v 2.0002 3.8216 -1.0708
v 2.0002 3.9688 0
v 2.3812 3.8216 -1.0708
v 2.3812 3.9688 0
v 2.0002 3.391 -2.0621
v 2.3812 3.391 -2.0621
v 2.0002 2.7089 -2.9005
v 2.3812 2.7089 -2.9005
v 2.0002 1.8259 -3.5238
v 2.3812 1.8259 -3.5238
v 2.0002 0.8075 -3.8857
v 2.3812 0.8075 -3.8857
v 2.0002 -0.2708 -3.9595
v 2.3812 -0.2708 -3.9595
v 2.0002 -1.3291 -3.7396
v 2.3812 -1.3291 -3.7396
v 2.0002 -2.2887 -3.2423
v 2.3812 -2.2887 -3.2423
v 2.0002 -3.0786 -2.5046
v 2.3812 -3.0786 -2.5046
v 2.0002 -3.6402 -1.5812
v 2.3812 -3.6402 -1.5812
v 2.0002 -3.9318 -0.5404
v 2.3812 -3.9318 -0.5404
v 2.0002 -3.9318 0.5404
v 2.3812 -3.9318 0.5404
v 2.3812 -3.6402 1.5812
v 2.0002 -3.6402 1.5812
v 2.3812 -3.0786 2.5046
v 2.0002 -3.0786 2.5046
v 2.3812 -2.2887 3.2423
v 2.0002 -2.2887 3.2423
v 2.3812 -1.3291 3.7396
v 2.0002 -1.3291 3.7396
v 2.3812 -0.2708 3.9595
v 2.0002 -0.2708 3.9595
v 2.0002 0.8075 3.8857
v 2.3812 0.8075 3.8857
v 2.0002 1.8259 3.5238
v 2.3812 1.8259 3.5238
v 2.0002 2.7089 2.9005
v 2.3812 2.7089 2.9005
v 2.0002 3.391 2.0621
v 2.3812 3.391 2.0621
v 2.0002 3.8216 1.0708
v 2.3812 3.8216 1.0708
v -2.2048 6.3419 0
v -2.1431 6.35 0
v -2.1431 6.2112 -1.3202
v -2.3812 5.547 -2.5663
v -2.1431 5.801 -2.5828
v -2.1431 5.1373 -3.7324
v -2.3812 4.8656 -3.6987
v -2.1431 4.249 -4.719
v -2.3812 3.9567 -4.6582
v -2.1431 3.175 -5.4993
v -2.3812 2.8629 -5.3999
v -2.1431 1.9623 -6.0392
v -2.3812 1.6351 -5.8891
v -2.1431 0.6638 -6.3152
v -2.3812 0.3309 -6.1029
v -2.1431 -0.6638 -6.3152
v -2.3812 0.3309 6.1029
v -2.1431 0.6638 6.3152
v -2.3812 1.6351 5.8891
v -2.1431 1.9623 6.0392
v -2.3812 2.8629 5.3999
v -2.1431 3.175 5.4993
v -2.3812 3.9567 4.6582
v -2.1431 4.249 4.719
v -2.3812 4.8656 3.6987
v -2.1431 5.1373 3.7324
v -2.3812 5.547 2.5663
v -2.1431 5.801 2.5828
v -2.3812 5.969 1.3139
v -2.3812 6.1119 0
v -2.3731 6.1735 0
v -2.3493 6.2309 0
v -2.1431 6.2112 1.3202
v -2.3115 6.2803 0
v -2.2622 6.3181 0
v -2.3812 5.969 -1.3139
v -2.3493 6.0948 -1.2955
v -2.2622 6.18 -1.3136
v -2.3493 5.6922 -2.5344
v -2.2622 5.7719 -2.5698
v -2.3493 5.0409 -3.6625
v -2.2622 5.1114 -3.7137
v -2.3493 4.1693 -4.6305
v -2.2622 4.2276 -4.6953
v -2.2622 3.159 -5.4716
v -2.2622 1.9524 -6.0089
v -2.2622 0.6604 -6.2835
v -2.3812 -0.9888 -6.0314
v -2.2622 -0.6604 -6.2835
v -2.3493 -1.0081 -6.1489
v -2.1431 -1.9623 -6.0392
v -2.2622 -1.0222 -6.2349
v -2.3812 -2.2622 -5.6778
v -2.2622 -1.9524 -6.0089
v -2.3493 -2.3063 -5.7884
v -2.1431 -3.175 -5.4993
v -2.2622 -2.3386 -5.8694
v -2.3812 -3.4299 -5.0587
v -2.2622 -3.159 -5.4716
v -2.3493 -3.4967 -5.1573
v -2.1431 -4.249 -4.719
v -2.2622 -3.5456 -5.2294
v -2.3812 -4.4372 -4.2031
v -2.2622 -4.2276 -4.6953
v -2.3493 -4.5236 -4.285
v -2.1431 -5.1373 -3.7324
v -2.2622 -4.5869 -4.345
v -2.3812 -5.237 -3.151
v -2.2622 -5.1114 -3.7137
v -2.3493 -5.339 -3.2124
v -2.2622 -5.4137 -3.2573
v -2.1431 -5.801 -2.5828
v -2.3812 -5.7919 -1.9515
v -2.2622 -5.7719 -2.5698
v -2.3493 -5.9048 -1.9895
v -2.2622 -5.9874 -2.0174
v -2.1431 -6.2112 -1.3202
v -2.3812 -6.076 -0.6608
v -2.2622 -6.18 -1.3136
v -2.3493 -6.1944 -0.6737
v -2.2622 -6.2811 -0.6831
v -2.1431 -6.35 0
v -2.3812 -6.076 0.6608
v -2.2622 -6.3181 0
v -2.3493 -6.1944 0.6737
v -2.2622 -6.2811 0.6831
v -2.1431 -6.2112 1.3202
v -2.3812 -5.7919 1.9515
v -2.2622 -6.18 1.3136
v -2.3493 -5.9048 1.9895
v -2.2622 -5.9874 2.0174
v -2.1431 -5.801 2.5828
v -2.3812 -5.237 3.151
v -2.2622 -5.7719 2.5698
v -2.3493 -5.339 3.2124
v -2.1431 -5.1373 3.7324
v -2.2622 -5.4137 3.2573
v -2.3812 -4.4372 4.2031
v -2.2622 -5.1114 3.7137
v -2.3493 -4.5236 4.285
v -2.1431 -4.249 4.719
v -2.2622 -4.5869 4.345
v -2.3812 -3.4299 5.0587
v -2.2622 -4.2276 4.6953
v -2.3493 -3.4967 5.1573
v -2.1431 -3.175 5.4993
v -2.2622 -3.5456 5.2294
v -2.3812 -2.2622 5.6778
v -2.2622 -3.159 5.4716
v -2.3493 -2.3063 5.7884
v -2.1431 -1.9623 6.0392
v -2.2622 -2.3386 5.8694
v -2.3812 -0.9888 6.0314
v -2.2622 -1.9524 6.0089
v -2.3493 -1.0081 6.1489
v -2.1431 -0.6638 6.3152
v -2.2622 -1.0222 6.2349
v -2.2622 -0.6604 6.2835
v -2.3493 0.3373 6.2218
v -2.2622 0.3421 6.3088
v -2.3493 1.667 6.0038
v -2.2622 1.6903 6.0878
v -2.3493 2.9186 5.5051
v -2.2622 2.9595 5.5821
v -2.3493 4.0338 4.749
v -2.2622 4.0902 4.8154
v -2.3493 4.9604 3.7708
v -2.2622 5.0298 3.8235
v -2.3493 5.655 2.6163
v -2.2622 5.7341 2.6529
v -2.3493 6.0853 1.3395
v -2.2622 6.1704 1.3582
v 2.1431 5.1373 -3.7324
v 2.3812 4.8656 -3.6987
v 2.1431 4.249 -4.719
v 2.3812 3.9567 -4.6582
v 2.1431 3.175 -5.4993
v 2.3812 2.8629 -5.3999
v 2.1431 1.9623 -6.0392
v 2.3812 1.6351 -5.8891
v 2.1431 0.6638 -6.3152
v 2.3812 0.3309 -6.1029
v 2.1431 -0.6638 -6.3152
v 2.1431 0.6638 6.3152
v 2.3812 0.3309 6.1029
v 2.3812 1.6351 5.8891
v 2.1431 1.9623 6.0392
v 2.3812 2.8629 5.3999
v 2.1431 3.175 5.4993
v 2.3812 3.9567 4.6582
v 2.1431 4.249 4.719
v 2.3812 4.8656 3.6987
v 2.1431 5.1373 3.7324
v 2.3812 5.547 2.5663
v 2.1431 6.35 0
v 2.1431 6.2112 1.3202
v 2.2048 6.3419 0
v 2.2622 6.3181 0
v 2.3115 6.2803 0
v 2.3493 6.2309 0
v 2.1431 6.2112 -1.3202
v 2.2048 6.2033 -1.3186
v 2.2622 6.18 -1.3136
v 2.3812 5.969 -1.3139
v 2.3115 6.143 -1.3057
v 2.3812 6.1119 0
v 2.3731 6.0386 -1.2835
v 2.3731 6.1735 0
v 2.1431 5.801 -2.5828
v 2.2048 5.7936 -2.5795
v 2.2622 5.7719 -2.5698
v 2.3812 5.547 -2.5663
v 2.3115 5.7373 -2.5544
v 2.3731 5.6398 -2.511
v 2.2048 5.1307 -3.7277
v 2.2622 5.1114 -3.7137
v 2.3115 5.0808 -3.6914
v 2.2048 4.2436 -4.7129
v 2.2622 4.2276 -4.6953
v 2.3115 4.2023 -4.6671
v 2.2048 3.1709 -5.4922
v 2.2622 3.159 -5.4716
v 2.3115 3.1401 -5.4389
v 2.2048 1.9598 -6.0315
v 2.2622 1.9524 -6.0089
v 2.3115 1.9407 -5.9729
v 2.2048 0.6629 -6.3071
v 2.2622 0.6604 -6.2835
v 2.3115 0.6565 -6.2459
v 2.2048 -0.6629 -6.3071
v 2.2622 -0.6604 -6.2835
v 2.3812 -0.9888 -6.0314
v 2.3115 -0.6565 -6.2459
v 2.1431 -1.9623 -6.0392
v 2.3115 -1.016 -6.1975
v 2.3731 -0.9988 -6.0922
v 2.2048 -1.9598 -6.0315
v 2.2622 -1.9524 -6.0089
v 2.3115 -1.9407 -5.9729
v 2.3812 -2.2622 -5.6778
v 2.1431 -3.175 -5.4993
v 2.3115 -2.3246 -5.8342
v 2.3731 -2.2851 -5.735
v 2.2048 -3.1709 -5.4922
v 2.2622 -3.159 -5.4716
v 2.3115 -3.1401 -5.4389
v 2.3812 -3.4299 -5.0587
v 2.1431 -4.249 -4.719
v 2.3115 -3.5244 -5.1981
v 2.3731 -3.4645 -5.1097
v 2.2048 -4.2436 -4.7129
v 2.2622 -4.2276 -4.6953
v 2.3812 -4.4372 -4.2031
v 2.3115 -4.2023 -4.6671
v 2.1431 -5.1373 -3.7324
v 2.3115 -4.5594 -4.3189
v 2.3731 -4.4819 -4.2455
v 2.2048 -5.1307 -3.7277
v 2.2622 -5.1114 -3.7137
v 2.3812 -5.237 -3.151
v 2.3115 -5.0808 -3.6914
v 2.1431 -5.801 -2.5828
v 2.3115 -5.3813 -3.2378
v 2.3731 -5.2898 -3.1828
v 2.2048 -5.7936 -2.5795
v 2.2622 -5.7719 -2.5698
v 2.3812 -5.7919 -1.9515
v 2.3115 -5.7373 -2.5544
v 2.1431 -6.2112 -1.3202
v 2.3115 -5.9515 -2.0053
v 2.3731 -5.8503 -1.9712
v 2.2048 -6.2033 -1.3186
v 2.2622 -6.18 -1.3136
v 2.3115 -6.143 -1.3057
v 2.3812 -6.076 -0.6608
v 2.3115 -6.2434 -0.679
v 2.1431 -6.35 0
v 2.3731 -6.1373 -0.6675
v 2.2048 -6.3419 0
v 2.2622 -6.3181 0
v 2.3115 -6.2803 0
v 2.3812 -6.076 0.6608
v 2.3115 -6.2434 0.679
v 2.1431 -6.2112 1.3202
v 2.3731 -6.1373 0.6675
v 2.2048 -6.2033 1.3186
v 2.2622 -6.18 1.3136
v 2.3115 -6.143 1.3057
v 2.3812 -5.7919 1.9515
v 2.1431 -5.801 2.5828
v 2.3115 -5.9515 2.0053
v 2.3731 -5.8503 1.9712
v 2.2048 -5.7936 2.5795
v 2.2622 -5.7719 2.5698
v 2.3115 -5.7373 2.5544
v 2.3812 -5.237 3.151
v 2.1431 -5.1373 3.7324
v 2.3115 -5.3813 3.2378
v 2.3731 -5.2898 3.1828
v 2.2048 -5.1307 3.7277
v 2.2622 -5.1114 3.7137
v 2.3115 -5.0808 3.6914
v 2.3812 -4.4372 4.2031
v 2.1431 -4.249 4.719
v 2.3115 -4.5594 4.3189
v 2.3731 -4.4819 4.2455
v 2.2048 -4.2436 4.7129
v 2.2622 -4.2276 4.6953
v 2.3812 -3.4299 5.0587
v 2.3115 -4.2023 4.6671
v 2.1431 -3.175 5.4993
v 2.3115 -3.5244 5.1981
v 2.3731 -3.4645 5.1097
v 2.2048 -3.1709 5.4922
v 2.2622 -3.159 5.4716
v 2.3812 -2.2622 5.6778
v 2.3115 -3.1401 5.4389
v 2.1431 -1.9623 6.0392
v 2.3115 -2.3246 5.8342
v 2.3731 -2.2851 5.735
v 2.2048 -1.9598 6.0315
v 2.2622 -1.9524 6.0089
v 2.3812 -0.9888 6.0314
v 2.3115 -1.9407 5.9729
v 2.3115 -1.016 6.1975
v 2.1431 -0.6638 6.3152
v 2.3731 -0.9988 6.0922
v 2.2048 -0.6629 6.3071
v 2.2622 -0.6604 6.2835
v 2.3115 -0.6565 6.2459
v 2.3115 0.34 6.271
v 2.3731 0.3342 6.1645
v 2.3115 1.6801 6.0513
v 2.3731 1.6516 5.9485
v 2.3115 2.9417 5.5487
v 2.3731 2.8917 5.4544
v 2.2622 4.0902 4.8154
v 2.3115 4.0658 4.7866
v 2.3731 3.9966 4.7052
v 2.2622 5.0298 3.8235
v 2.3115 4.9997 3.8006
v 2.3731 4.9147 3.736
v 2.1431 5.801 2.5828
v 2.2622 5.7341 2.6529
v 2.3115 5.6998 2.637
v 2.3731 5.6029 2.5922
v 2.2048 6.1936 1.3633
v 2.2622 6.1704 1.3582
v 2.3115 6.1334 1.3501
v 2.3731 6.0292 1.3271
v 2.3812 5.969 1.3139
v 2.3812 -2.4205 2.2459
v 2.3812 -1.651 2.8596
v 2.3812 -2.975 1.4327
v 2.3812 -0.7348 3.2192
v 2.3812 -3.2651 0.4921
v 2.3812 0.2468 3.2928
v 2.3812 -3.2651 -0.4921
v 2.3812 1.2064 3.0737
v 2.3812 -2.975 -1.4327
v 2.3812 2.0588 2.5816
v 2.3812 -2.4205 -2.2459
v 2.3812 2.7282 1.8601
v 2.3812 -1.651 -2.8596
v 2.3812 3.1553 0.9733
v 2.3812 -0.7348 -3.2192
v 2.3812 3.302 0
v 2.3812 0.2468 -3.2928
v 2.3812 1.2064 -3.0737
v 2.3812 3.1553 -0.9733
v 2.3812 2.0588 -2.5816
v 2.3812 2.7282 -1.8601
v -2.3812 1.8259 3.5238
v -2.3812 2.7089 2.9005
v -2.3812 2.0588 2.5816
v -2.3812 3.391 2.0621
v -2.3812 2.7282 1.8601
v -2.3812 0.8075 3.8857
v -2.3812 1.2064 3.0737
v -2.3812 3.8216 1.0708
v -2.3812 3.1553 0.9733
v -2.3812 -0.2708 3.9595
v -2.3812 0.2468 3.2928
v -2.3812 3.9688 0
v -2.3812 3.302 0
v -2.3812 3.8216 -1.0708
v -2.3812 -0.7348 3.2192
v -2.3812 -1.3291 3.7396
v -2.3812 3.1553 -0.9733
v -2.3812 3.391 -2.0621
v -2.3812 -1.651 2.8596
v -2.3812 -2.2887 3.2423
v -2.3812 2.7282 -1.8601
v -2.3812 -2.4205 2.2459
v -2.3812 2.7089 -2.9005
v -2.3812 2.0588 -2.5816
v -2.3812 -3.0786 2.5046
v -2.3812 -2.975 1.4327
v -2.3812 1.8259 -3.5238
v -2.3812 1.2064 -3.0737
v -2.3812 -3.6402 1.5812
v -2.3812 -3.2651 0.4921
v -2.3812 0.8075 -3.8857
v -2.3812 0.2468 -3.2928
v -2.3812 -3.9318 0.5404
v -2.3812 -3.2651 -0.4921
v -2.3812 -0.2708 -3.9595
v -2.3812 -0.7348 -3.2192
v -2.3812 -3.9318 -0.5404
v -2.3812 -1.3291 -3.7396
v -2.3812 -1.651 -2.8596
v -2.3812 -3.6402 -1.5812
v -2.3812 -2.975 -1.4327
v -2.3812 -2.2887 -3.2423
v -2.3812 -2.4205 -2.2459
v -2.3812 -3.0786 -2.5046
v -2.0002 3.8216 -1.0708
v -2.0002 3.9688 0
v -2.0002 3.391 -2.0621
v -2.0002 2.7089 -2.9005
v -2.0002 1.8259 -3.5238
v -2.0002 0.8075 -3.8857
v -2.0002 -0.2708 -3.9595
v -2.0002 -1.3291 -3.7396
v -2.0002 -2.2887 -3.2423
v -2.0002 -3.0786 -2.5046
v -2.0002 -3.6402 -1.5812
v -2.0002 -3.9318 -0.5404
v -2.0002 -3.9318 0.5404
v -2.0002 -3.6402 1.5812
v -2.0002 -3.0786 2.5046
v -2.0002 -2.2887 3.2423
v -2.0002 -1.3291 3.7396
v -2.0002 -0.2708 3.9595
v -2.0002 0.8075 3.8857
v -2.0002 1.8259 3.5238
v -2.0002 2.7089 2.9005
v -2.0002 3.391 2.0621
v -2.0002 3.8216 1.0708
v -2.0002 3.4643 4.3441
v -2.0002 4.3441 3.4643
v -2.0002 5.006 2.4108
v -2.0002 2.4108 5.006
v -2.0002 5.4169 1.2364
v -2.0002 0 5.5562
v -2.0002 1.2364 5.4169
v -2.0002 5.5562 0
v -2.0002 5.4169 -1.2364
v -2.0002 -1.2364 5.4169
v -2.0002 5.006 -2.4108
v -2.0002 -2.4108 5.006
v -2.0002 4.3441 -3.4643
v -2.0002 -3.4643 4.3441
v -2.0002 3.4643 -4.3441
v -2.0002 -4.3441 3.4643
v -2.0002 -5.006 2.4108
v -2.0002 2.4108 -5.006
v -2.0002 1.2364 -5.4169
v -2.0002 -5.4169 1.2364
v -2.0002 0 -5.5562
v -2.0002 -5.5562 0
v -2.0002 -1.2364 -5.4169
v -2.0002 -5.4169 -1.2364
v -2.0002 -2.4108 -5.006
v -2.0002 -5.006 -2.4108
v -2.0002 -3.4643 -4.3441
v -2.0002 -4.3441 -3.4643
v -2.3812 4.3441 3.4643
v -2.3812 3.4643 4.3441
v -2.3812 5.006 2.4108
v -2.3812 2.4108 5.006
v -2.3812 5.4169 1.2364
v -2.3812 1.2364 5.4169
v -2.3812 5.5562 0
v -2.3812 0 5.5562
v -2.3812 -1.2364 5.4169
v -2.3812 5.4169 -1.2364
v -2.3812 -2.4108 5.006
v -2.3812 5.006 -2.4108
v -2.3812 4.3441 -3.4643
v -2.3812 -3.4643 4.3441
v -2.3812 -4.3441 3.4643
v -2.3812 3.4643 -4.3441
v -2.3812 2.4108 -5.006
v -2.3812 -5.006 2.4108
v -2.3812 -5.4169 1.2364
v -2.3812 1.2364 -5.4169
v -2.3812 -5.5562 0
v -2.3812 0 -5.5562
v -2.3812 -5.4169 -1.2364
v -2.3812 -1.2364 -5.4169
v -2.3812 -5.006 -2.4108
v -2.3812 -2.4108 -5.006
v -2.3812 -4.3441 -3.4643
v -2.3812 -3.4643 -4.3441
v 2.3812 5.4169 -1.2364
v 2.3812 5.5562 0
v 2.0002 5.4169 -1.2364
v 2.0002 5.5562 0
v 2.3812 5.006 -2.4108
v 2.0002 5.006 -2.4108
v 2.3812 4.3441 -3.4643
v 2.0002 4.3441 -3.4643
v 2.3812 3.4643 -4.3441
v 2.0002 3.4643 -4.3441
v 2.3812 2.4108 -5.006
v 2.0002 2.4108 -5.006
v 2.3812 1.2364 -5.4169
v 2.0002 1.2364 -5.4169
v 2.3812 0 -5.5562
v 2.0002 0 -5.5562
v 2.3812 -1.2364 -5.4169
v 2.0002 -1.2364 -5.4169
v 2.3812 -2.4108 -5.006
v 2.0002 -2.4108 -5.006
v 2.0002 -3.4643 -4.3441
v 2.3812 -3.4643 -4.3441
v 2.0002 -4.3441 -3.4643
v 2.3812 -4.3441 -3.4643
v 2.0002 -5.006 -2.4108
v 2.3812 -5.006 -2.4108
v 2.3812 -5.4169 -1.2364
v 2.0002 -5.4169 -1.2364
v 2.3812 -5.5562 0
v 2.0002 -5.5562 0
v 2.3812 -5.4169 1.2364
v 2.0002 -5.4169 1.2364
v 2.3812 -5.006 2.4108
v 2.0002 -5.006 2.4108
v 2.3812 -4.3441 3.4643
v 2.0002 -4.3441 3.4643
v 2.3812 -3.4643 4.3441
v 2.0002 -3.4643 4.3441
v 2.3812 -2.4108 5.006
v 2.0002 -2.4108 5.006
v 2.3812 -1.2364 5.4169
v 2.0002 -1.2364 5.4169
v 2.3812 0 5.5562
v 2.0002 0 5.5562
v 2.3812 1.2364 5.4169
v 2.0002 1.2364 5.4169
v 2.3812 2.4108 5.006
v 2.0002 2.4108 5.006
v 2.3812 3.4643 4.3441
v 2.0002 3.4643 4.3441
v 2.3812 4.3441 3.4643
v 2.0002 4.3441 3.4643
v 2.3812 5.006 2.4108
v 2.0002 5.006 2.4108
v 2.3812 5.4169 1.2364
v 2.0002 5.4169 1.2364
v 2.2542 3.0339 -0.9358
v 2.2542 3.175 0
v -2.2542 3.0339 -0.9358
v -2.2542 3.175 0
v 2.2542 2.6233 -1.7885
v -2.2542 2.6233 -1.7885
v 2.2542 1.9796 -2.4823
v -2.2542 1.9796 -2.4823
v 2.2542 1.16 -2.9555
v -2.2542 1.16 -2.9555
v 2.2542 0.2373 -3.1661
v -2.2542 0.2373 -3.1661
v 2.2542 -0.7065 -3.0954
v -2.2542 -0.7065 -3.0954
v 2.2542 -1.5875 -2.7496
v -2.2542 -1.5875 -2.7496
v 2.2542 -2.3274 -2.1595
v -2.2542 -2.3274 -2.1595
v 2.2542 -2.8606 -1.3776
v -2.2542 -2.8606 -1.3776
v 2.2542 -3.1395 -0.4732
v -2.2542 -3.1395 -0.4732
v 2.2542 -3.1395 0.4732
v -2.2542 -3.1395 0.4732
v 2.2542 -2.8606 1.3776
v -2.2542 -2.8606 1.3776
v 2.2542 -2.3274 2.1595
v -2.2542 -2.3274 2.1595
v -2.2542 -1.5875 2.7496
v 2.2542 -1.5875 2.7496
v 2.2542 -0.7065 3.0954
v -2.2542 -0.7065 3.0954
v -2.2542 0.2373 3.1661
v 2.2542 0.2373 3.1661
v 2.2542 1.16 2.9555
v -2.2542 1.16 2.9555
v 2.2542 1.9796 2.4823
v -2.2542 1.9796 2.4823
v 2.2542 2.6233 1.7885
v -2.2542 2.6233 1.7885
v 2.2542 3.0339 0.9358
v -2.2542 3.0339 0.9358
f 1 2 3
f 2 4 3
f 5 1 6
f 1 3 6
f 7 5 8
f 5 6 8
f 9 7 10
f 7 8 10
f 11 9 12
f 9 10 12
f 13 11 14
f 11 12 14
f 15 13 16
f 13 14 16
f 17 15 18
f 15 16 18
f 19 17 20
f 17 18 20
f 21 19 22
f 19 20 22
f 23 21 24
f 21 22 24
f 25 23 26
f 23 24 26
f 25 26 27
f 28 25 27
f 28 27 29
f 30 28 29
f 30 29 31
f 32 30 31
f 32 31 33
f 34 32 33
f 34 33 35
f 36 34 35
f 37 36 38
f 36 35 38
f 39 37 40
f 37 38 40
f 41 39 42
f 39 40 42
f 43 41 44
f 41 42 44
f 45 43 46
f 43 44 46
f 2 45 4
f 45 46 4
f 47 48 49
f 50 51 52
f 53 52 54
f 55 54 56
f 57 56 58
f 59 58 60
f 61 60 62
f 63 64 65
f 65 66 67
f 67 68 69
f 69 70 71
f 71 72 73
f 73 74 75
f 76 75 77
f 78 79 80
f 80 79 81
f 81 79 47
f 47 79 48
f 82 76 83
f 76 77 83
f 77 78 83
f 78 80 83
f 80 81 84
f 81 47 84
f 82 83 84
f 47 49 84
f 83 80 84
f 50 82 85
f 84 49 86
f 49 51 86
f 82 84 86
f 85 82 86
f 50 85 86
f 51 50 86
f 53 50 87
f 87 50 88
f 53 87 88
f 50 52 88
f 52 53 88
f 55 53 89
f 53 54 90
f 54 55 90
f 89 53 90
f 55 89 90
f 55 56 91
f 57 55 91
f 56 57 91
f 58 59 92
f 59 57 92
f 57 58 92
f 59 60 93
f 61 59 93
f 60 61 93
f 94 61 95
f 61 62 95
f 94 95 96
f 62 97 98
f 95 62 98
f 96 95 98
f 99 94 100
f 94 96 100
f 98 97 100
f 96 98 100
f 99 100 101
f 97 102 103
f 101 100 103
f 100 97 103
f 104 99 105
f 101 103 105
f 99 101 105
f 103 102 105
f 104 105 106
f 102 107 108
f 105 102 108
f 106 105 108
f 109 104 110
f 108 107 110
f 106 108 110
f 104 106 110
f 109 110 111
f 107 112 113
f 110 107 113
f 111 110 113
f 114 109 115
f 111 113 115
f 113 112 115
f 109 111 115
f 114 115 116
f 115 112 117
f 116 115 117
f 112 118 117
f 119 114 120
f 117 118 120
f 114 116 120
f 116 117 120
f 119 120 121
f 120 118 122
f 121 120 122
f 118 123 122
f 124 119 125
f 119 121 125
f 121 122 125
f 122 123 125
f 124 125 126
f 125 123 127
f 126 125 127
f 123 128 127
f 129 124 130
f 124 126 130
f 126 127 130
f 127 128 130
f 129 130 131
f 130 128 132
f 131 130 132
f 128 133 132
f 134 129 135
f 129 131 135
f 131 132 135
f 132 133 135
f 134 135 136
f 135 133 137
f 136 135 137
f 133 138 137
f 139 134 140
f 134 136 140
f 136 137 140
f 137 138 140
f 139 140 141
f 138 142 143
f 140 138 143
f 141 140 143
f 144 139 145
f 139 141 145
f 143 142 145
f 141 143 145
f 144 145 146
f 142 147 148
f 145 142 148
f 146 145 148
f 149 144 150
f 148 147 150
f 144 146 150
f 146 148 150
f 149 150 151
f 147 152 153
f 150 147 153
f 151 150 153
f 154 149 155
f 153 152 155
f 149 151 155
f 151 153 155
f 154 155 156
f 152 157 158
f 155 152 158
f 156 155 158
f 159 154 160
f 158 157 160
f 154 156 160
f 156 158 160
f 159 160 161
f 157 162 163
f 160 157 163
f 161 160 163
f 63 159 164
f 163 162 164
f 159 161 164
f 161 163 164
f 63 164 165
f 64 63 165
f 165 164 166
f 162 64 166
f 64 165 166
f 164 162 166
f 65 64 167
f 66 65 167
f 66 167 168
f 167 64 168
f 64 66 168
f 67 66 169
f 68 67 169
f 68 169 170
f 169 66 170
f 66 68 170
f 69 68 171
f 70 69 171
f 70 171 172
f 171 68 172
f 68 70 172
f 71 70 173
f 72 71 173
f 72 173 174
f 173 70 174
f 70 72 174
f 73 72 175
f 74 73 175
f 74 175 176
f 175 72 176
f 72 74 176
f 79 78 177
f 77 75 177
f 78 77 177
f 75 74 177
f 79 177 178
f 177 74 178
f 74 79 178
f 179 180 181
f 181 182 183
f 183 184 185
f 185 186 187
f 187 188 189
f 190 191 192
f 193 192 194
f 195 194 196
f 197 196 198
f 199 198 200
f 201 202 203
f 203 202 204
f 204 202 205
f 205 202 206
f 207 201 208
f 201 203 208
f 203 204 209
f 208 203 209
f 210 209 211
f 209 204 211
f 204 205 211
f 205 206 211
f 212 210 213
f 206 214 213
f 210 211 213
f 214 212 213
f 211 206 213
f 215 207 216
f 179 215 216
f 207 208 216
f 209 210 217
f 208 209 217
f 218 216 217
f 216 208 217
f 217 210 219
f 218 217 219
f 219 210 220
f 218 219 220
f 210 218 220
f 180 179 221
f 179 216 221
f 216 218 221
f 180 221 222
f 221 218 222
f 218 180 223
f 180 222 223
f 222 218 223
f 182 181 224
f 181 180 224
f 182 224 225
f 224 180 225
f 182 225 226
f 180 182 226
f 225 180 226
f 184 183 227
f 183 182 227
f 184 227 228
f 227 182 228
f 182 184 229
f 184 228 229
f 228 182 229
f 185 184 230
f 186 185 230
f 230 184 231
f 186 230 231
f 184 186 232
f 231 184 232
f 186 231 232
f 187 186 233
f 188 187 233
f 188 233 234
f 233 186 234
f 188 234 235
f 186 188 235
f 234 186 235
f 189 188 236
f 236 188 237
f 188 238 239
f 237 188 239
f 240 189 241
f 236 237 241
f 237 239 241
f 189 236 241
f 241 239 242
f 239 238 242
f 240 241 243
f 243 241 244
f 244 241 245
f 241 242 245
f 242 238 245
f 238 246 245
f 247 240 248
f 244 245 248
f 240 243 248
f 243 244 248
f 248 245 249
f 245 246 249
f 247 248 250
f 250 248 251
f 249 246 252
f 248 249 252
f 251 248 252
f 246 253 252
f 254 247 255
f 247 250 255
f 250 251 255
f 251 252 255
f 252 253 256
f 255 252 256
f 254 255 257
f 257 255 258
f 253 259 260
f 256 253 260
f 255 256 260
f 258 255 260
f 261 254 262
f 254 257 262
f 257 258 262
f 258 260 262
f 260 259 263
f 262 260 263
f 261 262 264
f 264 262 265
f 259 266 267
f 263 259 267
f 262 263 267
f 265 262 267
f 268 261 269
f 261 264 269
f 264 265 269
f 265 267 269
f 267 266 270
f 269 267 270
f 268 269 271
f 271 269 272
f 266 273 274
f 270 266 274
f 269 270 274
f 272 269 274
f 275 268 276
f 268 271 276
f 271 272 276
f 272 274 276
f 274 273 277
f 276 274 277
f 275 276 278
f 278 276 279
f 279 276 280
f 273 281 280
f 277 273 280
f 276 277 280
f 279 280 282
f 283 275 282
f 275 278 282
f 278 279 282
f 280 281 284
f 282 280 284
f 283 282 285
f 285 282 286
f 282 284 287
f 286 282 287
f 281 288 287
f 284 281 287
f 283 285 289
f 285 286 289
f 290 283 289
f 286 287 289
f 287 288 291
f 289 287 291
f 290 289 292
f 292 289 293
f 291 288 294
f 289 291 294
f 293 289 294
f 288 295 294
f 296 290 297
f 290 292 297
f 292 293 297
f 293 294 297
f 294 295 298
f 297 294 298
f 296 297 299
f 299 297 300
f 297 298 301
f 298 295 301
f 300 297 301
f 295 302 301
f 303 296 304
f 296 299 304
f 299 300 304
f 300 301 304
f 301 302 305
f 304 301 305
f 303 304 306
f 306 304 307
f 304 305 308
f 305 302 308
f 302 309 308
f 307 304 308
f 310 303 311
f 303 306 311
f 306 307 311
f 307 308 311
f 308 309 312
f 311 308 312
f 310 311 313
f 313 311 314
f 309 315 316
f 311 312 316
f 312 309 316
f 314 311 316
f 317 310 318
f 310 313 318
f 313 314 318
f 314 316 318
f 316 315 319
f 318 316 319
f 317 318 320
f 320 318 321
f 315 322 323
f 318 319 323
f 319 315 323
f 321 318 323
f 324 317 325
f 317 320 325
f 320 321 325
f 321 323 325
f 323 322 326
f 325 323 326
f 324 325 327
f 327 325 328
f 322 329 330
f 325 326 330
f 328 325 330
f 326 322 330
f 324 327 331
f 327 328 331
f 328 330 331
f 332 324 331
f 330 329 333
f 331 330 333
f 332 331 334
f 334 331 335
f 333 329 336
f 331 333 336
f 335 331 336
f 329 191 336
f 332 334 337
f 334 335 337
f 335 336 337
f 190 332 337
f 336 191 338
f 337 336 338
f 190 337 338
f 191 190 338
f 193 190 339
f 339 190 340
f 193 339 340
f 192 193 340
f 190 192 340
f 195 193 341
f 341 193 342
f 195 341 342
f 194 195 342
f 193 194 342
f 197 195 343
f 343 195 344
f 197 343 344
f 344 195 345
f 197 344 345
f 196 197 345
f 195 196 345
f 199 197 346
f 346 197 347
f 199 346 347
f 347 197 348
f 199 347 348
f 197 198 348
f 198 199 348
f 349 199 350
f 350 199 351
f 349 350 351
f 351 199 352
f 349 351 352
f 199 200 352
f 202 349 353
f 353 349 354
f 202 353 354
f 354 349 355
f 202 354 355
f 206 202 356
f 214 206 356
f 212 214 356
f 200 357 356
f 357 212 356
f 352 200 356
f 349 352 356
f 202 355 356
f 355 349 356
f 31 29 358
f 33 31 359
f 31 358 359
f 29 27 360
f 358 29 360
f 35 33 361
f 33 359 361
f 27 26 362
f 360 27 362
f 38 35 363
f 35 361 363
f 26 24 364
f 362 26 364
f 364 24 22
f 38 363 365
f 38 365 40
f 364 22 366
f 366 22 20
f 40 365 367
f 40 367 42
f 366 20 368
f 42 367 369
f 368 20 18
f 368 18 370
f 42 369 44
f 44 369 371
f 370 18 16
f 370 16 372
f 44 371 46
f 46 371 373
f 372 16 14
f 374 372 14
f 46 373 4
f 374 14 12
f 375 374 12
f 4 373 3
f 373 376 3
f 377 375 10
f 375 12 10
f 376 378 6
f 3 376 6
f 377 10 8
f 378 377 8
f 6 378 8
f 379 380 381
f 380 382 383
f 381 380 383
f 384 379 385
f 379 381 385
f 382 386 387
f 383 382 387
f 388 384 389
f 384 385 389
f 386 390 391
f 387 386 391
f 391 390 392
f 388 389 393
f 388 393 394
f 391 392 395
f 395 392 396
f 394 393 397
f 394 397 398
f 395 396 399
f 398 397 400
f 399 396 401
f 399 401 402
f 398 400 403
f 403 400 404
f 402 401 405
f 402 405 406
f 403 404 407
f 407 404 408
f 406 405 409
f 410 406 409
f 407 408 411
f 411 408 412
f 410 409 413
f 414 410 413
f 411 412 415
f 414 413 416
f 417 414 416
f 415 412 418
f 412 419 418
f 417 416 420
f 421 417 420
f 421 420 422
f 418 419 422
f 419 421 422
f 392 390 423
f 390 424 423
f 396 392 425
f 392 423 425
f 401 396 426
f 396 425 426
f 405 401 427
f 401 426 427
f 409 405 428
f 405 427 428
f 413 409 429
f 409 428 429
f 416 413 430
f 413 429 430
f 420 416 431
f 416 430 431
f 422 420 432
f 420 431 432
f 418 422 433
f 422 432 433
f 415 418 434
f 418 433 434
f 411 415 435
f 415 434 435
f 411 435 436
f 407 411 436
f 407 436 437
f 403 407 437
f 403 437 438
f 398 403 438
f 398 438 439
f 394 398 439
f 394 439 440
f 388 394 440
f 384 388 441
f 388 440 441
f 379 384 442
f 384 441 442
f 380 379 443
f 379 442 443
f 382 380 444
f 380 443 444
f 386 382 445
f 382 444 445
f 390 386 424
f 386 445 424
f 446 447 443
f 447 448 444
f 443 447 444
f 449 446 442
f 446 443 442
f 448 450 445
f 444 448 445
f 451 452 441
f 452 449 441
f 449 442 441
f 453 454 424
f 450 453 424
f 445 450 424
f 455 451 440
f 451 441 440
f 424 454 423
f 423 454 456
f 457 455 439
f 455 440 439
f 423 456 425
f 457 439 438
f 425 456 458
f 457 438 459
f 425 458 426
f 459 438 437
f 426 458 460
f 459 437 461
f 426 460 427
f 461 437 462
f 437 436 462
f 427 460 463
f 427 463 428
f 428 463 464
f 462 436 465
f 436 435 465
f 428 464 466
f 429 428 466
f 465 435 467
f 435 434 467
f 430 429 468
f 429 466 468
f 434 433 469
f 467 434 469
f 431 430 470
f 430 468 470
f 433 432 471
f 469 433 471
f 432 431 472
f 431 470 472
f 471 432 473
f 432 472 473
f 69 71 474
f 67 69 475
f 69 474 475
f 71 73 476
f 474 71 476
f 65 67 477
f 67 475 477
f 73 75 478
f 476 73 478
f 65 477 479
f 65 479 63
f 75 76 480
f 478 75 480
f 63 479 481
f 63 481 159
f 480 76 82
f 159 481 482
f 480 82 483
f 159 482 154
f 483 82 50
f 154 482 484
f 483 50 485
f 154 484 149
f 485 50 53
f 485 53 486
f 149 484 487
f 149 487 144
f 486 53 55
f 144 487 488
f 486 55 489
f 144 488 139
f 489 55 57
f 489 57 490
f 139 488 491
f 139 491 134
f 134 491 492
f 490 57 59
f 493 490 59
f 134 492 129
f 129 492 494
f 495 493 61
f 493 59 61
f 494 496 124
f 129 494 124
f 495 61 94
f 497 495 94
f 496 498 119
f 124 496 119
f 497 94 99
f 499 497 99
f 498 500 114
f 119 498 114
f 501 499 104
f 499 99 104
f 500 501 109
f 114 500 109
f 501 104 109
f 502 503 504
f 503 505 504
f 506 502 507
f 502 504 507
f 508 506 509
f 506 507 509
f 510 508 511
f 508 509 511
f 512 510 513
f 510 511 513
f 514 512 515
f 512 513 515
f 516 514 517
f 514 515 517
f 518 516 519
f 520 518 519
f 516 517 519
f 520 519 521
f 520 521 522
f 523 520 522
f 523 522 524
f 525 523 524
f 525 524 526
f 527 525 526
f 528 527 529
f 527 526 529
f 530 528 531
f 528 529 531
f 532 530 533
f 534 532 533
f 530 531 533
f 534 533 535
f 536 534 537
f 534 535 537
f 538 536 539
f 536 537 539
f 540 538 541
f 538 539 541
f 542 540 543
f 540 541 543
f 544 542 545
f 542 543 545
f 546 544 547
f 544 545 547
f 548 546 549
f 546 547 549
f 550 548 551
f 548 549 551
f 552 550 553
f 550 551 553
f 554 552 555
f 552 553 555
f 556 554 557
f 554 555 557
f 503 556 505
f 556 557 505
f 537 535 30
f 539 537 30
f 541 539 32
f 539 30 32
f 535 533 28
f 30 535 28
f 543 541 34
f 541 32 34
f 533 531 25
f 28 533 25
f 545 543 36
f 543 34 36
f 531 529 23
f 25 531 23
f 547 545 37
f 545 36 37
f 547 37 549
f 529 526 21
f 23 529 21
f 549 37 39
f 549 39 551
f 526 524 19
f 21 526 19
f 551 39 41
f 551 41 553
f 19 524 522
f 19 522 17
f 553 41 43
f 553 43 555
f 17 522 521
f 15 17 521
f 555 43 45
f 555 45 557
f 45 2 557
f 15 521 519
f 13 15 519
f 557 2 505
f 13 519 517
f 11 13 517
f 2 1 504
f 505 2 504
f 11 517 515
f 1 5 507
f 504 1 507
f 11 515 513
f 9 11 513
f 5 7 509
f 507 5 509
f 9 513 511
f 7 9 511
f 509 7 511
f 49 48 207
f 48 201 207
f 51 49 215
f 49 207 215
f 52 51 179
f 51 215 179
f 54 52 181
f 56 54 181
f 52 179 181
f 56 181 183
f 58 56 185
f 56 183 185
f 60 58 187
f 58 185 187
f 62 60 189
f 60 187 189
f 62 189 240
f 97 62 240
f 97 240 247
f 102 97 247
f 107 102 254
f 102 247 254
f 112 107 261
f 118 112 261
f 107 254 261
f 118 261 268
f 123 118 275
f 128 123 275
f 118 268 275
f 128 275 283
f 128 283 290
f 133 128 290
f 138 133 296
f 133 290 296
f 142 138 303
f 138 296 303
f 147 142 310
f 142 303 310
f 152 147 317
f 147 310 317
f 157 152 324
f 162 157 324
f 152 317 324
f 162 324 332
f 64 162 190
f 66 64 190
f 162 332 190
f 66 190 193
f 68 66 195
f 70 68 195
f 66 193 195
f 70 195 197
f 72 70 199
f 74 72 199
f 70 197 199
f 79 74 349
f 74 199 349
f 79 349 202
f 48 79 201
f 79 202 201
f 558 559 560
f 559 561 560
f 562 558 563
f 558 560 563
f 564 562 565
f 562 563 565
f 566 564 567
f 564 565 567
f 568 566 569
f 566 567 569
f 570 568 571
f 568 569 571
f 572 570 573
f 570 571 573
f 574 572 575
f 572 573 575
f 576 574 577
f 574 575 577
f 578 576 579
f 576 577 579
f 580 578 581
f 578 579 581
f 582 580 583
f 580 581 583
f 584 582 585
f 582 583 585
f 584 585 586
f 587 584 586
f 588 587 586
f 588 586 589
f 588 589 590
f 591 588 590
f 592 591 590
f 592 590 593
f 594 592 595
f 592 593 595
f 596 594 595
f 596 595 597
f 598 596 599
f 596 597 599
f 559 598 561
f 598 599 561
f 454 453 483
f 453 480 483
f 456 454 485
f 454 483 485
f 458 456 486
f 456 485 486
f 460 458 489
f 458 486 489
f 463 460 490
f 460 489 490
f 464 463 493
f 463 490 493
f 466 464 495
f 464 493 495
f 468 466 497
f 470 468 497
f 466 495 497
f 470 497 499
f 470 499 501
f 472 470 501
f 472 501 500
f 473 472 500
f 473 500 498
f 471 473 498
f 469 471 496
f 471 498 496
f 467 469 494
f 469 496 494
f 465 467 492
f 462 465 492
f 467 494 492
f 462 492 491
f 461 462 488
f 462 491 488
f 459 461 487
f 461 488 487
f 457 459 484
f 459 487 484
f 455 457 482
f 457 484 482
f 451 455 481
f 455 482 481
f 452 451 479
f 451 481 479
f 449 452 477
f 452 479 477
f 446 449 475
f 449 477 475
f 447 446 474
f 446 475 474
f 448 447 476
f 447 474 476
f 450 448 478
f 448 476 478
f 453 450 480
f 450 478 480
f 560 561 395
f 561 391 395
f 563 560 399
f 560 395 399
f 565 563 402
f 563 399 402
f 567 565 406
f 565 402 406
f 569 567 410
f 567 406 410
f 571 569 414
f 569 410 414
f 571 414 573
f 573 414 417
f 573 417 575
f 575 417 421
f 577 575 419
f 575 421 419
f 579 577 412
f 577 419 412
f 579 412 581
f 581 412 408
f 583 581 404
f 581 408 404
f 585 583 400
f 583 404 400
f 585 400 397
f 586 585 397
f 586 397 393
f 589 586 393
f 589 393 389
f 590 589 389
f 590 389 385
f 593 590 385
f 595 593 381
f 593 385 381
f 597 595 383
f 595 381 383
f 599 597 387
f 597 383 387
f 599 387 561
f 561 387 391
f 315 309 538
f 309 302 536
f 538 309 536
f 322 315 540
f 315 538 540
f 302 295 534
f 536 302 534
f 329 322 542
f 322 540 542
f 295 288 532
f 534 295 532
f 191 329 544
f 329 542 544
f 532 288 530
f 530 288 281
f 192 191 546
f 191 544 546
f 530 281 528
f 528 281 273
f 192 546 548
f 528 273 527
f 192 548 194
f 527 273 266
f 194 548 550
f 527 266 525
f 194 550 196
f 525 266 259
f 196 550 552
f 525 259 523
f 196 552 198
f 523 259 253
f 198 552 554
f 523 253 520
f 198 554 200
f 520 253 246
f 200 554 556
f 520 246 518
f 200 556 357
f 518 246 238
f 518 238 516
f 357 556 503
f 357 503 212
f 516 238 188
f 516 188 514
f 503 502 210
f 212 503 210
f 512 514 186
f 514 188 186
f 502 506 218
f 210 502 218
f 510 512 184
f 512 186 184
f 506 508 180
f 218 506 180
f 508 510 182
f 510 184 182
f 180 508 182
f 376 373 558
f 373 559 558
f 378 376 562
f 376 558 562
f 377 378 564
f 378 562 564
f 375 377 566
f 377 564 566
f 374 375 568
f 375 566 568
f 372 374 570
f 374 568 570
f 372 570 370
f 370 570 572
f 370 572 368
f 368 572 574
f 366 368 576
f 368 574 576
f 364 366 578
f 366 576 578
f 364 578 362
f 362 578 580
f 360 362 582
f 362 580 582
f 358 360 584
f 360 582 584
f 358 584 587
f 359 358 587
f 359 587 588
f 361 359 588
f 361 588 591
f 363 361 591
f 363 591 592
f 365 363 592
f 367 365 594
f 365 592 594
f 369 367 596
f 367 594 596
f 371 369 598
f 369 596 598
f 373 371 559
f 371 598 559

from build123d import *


with BuildPart() as part:
    # Sketch1 → Revolve1 (revolve)
    with BuildSketch(Plane(origin=(0, 0, 0), x_dir=(-1, 0, 0), z_dir=(0, 0, -1))):
        with BuildLine():
            Line((-2.38125, 3.302), (-2.25425, 3.175))
            Line((-2.25425, 3.175), (2.25425, 3.175))
            Line((2.25425, 3.175), (2.38125, 3.302))
            Line((2.38125, 3.302), (2.38125, 3.96875))
            Line((2.38125, 3.96875), (2.00025, 3.96875))
            Line((2.00025, 3.96875), (2.00025, 5.55625))
            Line((2.00025, 5.55625), (2.38125, 5.55625))
            Line((2.38125, 5.55625), (2.38125, 6.111875))
            ThreePointArc((2.38125, 6.111875), (2.311504802, 6.280254802), (2.143125, 6.35))
            Line((2.143125, 6.35), (-2.143125, 6.35))
            ThreePointArc((-2.143125, 6.35), (-2.311504802, 6.280254802), (-2.38125, 6.111875))
            Line((-2.38125, 6.111875), (-2.38125, 5.55625))
            Line((-2.38125, 5.55625), (-2.00025, 5.55625))
            Line((-2.00025, 5.55625), (-2.00025, 3.96875))
            Line((-2.00025, 3.96875), (-2.38125, 3.96875))
            Line((-2.38125, 3.96875), (-2.38125, 3.302))
        make_face()
    revolve(axis=Axis((2.382500003, 0, 0), (-1, 0, 0)))


solid = part.part
